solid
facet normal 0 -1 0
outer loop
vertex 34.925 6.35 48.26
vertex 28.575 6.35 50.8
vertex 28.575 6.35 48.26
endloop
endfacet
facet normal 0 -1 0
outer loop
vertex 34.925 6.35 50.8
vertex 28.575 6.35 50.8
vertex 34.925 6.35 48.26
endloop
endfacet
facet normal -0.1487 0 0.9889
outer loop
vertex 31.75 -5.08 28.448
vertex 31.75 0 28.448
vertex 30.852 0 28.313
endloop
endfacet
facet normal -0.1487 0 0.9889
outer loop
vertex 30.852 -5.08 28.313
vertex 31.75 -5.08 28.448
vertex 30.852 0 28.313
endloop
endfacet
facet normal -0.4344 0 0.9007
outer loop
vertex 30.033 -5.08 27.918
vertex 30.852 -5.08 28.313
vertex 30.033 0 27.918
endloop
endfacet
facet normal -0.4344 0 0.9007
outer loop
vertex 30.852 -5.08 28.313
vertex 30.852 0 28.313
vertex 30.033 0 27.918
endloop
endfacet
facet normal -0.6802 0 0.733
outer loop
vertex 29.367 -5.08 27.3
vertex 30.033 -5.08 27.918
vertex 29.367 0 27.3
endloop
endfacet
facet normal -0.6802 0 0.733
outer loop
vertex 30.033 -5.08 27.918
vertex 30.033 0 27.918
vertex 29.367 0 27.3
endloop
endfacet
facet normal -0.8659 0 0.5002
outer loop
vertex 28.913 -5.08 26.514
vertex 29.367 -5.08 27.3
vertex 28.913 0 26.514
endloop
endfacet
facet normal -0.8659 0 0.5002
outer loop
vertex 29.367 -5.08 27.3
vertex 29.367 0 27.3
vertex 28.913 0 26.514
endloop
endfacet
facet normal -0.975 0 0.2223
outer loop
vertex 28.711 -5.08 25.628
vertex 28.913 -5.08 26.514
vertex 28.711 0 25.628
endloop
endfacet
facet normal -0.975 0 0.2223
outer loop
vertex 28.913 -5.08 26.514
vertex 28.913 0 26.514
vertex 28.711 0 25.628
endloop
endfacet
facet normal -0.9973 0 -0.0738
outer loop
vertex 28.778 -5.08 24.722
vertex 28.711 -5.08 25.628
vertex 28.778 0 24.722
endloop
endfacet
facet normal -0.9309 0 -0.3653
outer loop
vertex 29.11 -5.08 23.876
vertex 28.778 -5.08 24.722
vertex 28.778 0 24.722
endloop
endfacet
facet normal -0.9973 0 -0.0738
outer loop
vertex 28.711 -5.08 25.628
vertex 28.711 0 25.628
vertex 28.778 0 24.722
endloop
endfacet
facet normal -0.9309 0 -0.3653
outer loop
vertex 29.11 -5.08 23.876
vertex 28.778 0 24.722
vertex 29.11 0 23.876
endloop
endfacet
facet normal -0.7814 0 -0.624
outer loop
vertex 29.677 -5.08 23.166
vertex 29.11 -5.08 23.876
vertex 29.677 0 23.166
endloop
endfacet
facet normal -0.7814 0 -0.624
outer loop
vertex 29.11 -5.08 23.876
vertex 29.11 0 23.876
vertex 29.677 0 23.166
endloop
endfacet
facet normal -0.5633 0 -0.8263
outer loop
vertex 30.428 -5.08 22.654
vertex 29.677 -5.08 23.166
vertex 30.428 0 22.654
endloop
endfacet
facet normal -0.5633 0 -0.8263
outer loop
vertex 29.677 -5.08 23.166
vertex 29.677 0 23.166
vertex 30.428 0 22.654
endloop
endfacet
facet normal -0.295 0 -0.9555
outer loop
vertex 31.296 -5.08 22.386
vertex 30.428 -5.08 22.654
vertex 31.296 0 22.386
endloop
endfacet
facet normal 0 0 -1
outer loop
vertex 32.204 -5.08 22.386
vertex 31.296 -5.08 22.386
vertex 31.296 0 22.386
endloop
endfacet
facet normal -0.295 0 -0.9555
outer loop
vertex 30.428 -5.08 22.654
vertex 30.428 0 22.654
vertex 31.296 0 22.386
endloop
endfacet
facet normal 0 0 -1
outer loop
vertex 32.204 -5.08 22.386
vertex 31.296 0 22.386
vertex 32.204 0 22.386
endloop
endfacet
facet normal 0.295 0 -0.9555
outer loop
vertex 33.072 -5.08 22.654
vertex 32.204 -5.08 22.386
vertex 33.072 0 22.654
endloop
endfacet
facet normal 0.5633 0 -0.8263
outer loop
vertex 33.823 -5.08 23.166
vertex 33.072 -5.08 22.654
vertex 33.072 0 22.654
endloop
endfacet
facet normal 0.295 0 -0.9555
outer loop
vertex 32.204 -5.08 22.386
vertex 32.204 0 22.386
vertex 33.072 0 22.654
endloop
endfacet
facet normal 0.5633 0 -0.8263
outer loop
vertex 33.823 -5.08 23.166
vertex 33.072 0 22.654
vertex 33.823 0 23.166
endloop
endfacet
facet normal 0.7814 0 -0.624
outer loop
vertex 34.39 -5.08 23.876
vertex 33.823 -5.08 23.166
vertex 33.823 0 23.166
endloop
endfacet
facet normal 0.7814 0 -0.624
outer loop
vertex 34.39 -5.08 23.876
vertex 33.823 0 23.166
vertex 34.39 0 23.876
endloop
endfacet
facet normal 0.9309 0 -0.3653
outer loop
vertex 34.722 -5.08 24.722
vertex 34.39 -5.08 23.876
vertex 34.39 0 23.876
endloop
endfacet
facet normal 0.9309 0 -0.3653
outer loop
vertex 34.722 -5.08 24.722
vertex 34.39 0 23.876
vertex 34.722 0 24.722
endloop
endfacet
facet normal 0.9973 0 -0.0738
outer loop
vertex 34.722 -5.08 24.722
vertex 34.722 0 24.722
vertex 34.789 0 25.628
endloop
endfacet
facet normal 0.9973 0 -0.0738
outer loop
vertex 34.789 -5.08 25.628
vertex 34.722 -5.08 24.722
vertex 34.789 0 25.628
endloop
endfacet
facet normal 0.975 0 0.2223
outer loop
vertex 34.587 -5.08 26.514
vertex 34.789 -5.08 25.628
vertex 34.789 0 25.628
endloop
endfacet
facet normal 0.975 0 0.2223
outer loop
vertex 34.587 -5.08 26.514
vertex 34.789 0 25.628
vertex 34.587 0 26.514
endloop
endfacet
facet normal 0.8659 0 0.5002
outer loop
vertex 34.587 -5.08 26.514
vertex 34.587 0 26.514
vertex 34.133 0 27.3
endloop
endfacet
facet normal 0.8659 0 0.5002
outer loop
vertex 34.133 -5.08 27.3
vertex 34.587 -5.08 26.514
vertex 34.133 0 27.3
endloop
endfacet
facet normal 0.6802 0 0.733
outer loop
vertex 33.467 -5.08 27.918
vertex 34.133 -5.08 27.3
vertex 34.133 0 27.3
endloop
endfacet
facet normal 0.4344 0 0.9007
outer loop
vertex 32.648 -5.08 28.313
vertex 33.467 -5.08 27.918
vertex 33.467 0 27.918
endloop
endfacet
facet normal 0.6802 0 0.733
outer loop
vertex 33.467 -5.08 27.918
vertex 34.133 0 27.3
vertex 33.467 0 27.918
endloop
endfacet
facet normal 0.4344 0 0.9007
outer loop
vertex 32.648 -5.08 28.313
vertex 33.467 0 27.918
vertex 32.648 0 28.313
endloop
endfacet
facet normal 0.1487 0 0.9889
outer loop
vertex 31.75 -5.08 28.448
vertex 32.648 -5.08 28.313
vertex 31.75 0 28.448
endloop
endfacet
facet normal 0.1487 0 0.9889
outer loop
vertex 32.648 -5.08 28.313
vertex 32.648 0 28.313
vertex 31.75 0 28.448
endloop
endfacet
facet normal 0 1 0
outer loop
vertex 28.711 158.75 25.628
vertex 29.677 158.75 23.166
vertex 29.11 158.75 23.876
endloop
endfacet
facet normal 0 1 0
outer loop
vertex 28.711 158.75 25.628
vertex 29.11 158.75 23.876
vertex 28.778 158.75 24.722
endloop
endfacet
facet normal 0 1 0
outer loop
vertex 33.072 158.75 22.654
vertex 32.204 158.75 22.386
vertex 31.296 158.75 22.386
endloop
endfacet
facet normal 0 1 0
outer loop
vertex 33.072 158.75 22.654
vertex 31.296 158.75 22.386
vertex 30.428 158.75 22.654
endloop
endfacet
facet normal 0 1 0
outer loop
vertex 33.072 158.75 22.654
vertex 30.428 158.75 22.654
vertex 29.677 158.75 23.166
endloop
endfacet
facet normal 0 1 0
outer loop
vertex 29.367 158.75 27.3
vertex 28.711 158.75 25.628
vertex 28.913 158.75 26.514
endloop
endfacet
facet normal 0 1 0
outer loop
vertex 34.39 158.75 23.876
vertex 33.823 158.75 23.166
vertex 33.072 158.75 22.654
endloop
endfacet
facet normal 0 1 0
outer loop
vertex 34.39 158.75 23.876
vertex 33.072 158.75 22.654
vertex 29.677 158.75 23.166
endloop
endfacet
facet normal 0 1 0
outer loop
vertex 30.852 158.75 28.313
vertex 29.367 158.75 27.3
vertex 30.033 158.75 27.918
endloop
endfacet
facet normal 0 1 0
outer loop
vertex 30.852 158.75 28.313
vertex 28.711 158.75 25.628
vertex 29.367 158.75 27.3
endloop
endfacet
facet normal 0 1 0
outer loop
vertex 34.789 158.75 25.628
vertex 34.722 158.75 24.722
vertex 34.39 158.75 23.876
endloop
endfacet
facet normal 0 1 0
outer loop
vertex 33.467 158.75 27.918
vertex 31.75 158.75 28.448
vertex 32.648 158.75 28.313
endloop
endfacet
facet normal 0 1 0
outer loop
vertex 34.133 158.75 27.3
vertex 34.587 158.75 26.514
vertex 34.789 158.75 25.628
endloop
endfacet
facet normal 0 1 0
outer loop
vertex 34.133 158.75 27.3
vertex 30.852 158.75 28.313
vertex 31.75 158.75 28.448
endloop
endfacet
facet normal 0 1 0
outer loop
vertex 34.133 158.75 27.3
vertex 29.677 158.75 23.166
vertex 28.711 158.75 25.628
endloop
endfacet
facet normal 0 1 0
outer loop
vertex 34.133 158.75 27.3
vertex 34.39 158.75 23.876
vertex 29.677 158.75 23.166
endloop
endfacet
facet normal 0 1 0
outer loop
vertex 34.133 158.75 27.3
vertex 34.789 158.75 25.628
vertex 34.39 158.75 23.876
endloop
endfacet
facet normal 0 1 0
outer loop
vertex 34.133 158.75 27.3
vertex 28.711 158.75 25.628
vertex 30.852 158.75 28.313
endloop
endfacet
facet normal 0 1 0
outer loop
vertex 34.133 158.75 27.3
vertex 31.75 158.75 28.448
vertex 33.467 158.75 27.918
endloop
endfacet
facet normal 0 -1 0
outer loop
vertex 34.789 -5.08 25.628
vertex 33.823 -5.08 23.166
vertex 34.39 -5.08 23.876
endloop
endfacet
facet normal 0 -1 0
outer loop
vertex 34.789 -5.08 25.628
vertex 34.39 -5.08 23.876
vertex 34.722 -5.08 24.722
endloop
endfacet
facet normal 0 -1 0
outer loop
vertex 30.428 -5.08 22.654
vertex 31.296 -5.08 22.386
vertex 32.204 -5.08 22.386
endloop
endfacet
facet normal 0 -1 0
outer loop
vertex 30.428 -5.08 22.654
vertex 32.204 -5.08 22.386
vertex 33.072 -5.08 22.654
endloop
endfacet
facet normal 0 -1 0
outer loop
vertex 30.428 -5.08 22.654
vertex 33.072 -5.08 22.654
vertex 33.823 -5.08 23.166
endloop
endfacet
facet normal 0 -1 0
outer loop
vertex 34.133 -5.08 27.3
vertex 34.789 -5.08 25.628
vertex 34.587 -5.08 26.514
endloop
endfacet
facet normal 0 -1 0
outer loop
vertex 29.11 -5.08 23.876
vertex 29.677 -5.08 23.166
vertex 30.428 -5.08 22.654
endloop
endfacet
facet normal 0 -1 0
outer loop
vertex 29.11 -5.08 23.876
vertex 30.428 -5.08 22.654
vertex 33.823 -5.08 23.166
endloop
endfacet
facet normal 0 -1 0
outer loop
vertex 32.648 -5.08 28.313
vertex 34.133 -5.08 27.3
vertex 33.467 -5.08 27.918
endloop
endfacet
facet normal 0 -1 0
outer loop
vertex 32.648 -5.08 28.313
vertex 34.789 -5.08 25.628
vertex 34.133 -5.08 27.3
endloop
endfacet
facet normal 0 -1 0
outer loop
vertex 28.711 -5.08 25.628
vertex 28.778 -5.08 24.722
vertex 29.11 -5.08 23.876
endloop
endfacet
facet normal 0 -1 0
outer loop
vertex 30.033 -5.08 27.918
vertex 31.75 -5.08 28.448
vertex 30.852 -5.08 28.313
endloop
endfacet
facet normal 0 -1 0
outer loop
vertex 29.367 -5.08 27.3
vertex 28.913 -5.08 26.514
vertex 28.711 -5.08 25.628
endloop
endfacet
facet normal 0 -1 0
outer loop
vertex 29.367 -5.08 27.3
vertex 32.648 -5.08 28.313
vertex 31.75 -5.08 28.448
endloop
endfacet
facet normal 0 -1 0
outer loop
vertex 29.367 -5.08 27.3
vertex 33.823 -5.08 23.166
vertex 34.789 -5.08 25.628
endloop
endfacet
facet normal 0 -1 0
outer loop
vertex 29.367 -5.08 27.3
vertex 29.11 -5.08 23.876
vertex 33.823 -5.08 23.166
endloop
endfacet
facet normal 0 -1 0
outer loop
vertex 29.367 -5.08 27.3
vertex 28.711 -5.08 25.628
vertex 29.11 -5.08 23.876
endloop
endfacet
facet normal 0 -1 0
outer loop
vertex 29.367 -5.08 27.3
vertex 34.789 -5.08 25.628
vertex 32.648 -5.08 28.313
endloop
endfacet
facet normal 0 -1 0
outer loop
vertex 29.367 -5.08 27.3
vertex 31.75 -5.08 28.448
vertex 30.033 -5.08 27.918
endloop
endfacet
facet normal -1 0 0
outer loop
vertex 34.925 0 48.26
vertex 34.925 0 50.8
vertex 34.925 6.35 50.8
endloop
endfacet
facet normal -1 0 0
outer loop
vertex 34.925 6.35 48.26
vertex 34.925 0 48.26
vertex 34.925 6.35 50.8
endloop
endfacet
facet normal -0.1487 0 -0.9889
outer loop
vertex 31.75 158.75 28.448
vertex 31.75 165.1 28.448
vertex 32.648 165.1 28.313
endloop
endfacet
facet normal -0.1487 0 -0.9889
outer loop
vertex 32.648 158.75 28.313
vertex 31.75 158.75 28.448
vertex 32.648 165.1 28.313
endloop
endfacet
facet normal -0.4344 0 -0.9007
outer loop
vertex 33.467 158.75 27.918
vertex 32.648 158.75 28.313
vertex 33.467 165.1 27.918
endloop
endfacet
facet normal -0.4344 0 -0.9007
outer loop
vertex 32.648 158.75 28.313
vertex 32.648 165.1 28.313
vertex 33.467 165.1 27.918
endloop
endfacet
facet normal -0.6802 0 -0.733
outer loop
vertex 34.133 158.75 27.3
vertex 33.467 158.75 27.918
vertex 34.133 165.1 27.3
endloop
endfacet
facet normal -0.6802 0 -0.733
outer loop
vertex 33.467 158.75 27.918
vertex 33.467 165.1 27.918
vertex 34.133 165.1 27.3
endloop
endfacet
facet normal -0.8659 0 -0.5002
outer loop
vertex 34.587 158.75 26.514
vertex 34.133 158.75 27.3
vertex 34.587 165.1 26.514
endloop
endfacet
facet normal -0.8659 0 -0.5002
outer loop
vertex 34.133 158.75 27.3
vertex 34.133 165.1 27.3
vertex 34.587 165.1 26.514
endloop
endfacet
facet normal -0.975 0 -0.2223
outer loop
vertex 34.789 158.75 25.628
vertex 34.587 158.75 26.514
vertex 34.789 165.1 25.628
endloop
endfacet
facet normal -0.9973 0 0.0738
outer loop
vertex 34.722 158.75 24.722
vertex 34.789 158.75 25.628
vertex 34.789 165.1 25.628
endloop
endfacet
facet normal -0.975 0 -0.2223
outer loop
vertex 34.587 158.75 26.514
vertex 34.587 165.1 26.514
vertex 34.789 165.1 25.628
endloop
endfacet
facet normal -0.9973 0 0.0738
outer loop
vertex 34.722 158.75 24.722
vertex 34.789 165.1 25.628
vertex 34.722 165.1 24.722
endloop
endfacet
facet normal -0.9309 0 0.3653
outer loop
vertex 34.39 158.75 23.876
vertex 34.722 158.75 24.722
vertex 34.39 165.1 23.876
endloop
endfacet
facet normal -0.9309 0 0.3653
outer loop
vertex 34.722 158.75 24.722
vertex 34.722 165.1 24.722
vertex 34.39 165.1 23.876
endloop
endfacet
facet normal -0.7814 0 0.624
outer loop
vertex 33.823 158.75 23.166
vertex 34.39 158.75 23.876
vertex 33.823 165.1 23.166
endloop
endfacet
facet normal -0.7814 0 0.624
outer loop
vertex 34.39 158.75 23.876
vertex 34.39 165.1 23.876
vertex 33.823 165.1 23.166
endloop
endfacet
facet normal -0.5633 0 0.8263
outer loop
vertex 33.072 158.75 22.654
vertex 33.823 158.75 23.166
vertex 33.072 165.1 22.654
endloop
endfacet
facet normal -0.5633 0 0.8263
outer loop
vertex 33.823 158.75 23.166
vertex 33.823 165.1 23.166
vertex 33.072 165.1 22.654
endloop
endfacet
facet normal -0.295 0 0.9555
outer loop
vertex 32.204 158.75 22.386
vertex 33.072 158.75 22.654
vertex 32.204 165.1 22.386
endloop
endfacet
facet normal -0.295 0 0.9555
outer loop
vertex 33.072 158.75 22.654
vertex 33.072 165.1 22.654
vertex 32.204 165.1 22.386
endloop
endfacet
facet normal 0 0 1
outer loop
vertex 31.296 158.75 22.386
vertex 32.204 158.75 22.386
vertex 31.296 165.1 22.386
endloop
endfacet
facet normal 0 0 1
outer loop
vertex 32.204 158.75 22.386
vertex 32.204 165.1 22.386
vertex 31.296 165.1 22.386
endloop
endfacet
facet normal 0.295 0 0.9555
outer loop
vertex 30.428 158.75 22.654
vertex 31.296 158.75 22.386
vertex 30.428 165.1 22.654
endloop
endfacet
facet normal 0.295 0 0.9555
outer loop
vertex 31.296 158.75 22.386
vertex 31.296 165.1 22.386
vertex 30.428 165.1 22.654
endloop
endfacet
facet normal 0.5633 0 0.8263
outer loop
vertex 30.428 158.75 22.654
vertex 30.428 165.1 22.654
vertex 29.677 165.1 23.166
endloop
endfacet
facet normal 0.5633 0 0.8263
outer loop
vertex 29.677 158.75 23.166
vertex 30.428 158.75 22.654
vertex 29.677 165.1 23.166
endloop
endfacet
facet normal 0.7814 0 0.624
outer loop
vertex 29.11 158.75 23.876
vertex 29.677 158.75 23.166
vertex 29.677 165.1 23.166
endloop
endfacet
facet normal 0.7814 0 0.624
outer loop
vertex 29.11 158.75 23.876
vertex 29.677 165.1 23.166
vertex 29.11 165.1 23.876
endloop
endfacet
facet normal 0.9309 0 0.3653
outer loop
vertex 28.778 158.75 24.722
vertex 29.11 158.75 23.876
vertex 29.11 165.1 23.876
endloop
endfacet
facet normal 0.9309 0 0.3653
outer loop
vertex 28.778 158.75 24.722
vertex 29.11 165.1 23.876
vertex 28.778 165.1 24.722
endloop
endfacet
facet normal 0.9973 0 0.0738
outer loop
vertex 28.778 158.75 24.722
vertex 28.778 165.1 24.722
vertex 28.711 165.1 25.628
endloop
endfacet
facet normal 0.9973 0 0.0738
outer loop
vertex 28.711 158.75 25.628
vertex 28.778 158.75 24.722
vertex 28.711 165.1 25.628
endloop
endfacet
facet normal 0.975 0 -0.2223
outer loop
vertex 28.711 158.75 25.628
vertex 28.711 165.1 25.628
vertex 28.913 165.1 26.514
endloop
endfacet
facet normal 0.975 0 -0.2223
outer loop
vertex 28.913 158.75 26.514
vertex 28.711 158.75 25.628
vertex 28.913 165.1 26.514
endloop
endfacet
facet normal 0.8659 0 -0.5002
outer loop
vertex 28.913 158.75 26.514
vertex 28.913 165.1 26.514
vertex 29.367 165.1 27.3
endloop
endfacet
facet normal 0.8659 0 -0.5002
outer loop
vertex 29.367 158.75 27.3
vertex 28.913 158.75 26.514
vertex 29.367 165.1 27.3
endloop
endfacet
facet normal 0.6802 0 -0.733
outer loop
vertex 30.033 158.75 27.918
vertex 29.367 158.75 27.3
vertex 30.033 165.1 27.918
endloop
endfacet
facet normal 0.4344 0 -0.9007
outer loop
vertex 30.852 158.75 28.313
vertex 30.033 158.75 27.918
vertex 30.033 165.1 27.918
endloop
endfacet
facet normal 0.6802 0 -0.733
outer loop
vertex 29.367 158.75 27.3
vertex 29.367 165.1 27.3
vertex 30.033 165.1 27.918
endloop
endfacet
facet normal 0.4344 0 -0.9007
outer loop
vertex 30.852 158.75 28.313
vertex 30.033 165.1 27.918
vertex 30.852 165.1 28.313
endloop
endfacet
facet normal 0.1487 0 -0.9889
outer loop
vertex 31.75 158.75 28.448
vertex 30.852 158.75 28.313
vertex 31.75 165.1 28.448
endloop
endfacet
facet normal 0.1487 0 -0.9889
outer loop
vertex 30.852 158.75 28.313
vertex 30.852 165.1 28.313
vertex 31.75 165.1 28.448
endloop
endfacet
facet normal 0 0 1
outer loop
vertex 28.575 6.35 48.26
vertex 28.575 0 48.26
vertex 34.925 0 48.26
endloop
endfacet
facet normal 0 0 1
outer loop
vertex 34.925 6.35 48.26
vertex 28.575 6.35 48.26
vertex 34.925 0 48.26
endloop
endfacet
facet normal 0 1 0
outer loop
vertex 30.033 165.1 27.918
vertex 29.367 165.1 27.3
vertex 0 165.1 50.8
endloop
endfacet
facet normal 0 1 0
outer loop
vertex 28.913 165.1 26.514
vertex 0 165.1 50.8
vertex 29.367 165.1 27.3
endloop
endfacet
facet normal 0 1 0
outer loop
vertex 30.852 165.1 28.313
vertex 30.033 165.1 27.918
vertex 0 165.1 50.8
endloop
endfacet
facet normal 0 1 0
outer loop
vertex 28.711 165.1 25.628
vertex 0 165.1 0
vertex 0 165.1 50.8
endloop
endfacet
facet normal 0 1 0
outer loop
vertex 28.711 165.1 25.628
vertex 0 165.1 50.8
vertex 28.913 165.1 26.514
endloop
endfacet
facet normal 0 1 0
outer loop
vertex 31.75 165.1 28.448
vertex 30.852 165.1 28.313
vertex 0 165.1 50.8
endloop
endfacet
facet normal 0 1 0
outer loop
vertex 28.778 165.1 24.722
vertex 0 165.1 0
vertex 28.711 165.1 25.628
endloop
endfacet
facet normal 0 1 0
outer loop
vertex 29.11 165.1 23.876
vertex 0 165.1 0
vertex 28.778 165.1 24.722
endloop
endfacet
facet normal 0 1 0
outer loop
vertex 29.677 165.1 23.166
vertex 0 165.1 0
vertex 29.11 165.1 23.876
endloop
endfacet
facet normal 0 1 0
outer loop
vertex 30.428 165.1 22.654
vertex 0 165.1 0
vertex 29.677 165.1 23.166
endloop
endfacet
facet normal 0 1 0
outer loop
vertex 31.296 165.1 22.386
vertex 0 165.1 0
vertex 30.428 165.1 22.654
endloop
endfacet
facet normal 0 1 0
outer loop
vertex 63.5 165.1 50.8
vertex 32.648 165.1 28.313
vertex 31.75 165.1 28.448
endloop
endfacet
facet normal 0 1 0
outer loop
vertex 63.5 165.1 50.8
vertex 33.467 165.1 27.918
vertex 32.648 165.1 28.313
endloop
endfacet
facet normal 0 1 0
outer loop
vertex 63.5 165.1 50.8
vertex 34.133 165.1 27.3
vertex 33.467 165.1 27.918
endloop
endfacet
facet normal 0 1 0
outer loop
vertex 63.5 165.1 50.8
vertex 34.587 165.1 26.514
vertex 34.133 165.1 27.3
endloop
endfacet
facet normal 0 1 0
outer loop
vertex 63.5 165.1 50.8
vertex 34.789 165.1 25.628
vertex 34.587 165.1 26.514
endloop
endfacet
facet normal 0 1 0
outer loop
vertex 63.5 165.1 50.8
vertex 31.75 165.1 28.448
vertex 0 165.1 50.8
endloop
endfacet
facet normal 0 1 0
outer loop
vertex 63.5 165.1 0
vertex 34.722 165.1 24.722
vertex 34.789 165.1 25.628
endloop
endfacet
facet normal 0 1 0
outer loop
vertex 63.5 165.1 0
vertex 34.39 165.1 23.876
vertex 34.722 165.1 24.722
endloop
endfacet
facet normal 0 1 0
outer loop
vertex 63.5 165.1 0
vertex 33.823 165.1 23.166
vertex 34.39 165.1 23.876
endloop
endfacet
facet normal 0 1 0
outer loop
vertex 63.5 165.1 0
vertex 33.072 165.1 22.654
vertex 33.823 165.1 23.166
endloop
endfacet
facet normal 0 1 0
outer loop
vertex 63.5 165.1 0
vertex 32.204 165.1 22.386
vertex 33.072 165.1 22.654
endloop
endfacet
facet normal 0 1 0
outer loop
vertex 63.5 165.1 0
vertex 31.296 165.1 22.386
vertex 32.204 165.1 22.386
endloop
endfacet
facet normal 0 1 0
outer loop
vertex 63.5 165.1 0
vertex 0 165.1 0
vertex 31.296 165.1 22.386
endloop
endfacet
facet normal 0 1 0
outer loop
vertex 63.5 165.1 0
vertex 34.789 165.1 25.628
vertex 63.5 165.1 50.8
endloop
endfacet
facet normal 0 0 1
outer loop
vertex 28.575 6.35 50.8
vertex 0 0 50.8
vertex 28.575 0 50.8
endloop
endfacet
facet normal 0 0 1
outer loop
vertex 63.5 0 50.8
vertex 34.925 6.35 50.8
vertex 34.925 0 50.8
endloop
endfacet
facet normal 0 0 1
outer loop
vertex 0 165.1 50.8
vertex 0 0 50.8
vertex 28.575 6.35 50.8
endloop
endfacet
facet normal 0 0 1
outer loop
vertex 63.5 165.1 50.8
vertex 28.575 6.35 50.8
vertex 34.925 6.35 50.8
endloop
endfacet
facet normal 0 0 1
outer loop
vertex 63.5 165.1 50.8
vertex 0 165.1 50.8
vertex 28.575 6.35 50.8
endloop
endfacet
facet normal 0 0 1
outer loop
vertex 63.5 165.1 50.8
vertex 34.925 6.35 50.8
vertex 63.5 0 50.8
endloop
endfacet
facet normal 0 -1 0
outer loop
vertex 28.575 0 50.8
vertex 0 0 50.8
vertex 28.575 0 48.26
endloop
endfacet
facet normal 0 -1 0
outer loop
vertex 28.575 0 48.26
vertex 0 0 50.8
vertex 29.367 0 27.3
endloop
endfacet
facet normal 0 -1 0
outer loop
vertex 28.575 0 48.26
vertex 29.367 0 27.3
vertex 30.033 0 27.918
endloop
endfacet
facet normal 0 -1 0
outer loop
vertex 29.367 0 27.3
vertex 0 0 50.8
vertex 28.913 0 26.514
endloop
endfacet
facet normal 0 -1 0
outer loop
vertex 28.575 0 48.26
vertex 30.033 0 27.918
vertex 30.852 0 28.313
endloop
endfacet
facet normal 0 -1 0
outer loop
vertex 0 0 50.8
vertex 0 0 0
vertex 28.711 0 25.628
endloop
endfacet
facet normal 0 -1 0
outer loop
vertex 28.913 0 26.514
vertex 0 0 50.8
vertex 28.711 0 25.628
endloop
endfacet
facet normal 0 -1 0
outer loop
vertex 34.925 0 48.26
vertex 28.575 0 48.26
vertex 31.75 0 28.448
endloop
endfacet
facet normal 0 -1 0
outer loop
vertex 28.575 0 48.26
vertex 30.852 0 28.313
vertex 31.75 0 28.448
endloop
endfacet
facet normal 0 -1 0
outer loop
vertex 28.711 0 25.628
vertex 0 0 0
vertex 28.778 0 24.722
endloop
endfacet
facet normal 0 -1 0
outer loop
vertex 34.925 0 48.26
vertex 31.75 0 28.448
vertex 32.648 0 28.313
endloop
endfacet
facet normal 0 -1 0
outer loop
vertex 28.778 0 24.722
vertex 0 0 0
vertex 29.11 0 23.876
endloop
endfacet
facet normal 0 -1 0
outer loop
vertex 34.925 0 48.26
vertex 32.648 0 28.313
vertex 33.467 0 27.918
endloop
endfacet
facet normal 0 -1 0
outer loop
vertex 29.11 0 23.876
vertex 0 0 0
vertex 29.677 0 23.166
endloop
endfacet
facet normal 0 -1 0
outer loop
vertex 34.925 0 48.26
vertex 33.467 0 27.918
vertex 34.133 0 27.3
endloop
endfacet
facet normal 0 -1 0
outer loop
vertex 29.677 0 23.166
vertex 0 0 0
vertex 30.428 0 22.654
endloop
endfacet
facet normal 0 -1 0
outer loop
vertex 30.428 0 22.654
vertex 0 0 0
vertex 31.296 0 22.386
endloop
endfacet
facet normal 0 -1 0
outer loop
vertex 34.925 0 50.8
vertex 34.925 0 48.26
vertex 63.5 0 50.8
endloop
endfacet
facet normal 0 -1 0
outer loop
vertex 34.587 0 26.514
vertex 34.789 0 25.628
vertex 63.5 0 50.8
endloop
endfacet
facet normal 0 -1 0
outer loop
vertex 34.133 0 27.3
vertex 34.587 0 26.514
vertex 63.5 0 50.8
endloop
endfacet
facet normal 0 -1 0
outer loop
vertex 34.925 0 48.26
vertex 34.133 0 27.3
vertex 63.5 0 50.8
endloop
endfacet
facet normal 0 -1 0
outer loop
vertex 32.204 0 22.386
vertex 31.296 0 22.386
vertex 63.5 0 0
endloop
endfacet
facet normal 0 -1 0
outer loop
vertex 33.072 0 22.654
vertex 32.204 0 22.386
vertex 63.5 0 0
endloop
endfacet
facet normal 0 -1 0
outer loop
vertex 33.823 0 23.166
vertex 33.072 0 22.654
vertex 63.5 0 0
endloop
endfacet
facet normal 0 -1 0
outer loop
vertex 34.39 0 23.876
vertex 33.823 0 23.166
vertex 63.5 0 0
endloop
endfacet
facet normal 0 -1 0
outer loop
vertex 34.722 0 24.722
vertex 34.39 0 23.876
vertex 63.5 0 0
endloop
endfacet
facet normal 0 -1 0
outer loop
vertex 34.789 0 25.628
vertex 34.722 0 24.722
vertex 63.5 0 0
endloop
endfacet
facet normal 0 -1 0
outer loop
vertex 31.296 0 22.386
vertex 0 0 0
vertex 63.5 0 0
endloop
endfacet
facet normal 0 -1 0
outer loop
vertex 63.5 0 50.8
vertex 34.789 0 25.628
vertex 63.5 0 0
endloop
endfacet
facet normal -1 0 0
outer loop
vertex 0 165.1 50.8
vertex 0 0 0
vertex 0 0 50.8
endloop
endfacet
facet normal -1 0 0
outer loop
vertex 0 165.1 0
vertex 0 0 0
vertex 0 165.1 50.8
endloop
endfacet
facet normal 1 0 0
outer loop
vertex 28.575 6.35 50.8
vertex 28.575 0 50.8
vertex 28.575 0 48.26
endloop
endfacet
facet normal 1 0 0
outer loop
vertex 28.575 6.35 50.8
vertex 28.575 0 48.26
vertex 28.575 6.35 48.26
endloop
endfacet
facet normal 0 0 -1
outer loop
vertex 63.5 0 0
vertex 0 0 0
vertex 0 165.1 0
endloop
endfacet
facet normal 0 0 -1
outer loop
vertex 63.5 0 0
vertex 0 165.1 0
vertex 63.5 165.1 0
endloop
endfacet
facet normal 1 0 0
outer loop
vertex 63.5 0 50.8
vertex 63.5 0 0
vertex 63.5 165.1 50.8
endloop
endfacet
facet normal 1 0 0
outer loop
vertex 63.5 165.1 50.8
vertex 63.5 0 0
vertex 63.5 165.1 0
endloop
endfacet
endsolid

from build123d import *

# Parameters (mm, degrees)
SKETCH1_W           = 63.5
SKETCH1_H           = 165.1
BOSS_EXTRUDE1_DEPTH = 50.8
SKETCH2_R           = 3.048
BOSS_EXTRUDE2_DEPTH = 5.08
SKETCH3_R           = 3.048
CUT_EXTRUDE1_DEPTH  = 6.35
SKETCH4_W           = 6.35
SKETCH4_H           = 6.35
CUT_EXTRUDE2_DEPTH  = 2.54


with BuildPart() as part:
    # Sketch1 → Boss-Extrude1 (new body)
    with BuildSketch(Plane.XY):
        with Locations((31.75, 82.55)):
            Rectangle(SKETCH1_W, SKETCH1_H)
    extrude(amount=BOSS_EXTRUDE1_DEPTH)

    # Sketch2 → Boss-Extrude2 (add)
    with BuildSketch(Plane.XZ):
        with Locations(Location((31.75, 25.4, 0), (0, 0, 90))):
            Circle(SKETCH2_R)
    extrude(amount=BOSS_EXTRUDE2_DEPTH)

    # Sketch3 → Cut-Extrude1 (cut)
    with BuildSketch(Plane(origin=(0, 165.1, 0), x_dir=(1, 0, 0), z_dir=(0, 1, 0))):
        with Locations(Location((31.75, -25.4, 0), (0, 0, 270))):
            Circle(SKETCH3_R)
    extrude(amount=-CUT_EXTRUDE1_DEPTH, mode=Mode.SUBTRACT)

    # Sketch4 → Cut-Extrude2 (cut)
    with BuildSketch(Plane.XY.offset(50.8)):
        with Locations((31.75, 3.175)):
            Rectangle(SKETCH4_W, SKETCH4_H)
    extrude(amount=-CUT_EXTRUDE2_DEPTH, mode=Mode.SUBTRACT)


solid = part.part
